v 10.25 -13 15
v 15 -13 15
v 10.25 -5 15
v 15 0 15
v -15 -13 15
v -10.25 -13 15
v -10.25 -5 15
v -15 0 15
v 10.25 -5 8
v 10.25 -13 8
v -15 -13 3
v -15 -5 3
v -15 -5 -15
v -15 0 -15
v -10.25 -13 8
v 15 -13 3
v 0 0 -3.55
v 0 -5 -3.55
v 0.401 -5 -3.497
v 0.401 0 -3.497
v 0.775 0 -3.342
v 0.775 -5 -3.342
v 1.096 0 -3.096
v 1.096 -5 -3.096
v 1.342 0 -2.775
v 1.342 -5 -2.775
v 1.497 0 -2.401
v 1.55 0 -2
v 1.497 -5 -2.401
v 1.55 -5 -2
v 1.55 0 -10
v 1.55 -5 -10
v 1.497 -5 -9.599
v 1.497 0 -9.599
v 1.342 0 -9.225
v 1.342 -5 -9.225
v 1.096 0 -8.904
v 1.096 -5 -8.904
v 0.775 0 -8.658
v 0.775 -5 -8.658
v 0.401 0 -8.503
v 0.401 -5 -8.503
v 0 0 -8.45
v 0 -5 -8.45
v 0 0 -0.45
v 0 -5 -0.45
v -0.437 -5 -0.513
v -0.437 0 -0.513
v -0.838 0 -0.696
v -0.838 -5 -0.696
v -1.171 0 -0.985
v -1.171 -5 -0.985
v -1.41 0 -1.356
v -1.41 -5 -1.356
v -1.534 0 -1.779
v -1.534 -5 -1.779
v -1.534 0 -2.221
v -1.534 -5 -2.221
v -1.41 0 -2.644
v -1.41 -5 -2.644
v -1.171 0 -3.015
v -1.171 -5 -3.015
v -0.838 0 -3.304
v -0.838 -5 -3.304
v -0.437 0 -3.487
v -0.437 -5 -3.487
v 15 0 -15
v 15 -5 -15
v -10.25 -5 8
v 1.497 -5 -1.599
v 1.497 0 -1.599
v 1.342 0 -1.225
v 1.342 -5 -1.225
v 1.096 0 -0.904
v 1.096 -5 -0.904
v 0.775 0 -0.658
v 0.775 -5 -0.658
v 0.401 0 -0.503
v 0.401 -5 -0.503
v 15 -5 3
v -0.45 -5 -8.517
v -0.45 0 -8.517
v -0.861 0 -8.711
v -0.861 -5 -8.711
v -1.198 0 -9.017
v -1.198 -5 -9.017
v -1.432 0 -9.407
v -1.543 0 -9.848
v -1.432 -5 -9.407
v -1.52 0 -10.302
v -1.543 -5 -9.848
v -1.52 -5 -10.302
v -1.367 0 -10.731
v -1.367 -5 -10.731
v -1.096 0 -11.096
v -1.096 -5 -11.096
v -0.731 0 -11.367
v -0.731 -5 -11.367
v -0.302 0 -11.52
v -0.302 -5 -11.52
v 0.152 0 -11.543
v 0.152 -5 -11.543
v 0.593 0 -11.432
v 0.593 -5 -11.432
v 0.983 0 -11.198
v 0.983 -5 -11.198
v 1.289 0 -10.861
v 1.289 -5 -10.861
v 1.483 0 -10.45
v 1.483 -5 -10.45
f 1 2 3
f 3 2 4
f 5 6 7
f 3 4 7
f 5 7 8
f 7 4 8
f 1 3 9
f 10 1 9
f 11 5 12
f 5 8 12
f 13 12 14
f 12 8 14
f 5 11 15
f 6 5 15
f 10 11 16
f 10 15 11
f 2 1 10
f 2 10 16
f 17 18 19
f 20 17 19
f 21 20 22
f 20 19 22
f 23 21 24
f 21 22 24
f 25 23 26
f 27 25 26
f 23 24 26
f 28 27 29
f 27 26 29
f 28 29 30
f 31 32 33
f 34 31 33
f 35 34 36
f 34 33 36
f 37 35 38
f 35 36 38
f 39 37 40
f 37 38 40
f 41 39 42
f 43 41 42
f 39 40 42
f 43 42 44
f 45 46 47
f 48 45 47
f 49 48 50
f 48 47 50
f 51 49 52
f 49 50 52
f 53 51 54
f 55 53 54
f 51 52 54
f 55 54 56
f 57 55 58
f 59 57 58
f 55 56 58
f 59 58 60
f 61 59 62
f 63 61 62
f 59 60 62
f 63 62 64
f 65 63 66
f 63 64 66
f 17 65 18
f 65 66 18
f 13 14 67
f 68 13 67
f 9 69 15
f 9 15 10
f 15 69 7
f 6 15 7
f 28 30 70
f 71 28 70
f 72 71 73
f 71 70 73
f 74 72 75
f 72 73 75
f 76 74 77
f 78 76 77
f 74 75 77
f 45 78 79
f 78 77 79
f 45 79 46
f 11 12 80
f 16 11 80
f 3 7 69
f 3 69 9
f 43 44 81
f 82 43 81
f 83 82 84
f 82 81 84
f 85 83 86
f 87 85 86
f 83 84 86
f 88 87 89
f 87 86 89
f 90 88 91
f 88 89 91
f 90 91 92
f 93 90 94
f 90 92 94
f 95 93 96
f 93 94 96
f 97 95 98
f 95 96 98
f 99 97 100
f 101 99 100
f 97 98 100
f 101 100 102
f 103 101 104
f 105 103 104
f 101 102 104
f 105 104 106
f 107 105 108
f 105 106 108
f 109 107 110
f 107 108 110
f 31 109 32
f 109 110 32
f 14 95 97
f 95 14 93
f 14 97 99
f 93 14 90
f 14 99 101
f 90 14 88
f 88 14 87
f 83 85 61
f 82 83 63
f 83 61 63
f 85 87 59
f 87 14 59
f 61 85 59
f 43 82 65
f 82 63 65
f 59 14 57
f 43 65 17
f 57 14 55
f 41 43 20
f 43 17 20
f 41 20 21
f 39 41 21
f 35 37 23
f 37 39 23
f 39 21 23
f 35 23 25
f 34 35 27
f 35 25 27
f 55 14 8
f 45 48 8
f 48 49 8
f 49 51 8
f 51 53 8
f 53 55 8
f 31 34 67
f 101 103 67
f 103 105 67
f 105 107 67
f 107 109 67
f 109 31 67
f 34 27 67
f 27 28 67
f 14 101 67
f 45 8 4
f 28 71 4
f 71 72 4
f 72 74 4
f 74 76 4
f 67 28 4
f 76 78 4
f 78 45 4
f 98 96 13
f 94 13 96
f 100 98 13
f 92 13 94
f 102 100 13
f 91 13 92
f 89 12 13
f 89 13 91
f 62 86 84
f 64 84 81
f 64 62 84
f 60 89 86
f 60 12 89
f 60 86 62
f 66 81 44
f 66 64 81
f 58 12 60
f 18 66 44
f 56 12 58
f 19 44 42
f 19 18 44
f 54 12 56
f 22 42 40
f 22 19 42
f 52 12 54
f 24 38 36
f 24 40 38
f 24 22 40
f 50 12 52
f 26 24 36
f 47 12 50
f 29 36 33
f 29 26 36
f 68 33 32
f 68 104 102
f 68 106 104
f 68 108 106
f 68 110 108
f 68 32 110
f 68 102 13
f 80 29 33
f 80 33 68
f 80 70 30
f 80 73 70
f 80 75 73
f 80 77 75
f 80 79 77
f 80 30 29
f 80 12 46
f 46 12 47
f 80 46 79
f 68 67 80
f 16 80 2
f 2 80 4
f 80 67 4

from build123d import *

# Parameters (mm, degrees)
F0_W     = 30
F0_H     = 30
F1_DEPTH = 5
F3_W     = 20.5
F3_H     = 5
F4_DEPTH = 8
F6_DEPTH = 25


with BuildPart() as f1:
    # F0 (on Front) → F1 (new body)
    with BuildSketch(Plane.XZ):
        Rectangle(F0_W, F0_H)
    extrude(amount=F1_DEPTH)

    # F3 (on face) → F4 (join)
    with BuildSketch(Plane.XZ.offset(5)):
        Polygon((-10.25, 8), (-10.25, 15), (-15, 15), (-15, 3), (-10.25, 3), align=None)
        with Locations((0, 5.5)):
            Rectangle(F3_W, F3_H)
        Polygon((15, 15), (10.25, 15), (10.25, 8), (10.25, 3), (15, 3), align=None)
    extrude(amount=F4_DEPTH)

    # F5 (on face) → F6 (cut)
    with BuildSketch(Plane.XZ.offset(5)):
        with BuildLine():
            Line((0, -2), (0, -0.45))
            ThreePointArc((0, -0.45), (-1.55, -2), (0, -3.55))
            Line((0, -3.55), (0, -2))
        make_face()
        with BuildLine():
            ThreePointArc((1.55, -2), (1.0960155108, -0.9039844892), (0, -0.45))
            Line((0, -0.45), (0, -2))
            Line((0, -2), (0, -3.55))
            ThreePointArc((0, -3.55), (1.0960155108, -3.0960155108), (1.55, -2))
        make_face()
        with BuildLine():
            ThreePointArc((1.55, -10), (1.0960155108, -8.9039844892), (0, -8.45))
            ThreePointArc((0, -8.45), (-1.0960155108, -11.0960155108), (1.55, -10))
        make_face()
    extrude(amount=-F6_DEPTH, mode=Mode.SUBTRACT)


solid = f1.part
